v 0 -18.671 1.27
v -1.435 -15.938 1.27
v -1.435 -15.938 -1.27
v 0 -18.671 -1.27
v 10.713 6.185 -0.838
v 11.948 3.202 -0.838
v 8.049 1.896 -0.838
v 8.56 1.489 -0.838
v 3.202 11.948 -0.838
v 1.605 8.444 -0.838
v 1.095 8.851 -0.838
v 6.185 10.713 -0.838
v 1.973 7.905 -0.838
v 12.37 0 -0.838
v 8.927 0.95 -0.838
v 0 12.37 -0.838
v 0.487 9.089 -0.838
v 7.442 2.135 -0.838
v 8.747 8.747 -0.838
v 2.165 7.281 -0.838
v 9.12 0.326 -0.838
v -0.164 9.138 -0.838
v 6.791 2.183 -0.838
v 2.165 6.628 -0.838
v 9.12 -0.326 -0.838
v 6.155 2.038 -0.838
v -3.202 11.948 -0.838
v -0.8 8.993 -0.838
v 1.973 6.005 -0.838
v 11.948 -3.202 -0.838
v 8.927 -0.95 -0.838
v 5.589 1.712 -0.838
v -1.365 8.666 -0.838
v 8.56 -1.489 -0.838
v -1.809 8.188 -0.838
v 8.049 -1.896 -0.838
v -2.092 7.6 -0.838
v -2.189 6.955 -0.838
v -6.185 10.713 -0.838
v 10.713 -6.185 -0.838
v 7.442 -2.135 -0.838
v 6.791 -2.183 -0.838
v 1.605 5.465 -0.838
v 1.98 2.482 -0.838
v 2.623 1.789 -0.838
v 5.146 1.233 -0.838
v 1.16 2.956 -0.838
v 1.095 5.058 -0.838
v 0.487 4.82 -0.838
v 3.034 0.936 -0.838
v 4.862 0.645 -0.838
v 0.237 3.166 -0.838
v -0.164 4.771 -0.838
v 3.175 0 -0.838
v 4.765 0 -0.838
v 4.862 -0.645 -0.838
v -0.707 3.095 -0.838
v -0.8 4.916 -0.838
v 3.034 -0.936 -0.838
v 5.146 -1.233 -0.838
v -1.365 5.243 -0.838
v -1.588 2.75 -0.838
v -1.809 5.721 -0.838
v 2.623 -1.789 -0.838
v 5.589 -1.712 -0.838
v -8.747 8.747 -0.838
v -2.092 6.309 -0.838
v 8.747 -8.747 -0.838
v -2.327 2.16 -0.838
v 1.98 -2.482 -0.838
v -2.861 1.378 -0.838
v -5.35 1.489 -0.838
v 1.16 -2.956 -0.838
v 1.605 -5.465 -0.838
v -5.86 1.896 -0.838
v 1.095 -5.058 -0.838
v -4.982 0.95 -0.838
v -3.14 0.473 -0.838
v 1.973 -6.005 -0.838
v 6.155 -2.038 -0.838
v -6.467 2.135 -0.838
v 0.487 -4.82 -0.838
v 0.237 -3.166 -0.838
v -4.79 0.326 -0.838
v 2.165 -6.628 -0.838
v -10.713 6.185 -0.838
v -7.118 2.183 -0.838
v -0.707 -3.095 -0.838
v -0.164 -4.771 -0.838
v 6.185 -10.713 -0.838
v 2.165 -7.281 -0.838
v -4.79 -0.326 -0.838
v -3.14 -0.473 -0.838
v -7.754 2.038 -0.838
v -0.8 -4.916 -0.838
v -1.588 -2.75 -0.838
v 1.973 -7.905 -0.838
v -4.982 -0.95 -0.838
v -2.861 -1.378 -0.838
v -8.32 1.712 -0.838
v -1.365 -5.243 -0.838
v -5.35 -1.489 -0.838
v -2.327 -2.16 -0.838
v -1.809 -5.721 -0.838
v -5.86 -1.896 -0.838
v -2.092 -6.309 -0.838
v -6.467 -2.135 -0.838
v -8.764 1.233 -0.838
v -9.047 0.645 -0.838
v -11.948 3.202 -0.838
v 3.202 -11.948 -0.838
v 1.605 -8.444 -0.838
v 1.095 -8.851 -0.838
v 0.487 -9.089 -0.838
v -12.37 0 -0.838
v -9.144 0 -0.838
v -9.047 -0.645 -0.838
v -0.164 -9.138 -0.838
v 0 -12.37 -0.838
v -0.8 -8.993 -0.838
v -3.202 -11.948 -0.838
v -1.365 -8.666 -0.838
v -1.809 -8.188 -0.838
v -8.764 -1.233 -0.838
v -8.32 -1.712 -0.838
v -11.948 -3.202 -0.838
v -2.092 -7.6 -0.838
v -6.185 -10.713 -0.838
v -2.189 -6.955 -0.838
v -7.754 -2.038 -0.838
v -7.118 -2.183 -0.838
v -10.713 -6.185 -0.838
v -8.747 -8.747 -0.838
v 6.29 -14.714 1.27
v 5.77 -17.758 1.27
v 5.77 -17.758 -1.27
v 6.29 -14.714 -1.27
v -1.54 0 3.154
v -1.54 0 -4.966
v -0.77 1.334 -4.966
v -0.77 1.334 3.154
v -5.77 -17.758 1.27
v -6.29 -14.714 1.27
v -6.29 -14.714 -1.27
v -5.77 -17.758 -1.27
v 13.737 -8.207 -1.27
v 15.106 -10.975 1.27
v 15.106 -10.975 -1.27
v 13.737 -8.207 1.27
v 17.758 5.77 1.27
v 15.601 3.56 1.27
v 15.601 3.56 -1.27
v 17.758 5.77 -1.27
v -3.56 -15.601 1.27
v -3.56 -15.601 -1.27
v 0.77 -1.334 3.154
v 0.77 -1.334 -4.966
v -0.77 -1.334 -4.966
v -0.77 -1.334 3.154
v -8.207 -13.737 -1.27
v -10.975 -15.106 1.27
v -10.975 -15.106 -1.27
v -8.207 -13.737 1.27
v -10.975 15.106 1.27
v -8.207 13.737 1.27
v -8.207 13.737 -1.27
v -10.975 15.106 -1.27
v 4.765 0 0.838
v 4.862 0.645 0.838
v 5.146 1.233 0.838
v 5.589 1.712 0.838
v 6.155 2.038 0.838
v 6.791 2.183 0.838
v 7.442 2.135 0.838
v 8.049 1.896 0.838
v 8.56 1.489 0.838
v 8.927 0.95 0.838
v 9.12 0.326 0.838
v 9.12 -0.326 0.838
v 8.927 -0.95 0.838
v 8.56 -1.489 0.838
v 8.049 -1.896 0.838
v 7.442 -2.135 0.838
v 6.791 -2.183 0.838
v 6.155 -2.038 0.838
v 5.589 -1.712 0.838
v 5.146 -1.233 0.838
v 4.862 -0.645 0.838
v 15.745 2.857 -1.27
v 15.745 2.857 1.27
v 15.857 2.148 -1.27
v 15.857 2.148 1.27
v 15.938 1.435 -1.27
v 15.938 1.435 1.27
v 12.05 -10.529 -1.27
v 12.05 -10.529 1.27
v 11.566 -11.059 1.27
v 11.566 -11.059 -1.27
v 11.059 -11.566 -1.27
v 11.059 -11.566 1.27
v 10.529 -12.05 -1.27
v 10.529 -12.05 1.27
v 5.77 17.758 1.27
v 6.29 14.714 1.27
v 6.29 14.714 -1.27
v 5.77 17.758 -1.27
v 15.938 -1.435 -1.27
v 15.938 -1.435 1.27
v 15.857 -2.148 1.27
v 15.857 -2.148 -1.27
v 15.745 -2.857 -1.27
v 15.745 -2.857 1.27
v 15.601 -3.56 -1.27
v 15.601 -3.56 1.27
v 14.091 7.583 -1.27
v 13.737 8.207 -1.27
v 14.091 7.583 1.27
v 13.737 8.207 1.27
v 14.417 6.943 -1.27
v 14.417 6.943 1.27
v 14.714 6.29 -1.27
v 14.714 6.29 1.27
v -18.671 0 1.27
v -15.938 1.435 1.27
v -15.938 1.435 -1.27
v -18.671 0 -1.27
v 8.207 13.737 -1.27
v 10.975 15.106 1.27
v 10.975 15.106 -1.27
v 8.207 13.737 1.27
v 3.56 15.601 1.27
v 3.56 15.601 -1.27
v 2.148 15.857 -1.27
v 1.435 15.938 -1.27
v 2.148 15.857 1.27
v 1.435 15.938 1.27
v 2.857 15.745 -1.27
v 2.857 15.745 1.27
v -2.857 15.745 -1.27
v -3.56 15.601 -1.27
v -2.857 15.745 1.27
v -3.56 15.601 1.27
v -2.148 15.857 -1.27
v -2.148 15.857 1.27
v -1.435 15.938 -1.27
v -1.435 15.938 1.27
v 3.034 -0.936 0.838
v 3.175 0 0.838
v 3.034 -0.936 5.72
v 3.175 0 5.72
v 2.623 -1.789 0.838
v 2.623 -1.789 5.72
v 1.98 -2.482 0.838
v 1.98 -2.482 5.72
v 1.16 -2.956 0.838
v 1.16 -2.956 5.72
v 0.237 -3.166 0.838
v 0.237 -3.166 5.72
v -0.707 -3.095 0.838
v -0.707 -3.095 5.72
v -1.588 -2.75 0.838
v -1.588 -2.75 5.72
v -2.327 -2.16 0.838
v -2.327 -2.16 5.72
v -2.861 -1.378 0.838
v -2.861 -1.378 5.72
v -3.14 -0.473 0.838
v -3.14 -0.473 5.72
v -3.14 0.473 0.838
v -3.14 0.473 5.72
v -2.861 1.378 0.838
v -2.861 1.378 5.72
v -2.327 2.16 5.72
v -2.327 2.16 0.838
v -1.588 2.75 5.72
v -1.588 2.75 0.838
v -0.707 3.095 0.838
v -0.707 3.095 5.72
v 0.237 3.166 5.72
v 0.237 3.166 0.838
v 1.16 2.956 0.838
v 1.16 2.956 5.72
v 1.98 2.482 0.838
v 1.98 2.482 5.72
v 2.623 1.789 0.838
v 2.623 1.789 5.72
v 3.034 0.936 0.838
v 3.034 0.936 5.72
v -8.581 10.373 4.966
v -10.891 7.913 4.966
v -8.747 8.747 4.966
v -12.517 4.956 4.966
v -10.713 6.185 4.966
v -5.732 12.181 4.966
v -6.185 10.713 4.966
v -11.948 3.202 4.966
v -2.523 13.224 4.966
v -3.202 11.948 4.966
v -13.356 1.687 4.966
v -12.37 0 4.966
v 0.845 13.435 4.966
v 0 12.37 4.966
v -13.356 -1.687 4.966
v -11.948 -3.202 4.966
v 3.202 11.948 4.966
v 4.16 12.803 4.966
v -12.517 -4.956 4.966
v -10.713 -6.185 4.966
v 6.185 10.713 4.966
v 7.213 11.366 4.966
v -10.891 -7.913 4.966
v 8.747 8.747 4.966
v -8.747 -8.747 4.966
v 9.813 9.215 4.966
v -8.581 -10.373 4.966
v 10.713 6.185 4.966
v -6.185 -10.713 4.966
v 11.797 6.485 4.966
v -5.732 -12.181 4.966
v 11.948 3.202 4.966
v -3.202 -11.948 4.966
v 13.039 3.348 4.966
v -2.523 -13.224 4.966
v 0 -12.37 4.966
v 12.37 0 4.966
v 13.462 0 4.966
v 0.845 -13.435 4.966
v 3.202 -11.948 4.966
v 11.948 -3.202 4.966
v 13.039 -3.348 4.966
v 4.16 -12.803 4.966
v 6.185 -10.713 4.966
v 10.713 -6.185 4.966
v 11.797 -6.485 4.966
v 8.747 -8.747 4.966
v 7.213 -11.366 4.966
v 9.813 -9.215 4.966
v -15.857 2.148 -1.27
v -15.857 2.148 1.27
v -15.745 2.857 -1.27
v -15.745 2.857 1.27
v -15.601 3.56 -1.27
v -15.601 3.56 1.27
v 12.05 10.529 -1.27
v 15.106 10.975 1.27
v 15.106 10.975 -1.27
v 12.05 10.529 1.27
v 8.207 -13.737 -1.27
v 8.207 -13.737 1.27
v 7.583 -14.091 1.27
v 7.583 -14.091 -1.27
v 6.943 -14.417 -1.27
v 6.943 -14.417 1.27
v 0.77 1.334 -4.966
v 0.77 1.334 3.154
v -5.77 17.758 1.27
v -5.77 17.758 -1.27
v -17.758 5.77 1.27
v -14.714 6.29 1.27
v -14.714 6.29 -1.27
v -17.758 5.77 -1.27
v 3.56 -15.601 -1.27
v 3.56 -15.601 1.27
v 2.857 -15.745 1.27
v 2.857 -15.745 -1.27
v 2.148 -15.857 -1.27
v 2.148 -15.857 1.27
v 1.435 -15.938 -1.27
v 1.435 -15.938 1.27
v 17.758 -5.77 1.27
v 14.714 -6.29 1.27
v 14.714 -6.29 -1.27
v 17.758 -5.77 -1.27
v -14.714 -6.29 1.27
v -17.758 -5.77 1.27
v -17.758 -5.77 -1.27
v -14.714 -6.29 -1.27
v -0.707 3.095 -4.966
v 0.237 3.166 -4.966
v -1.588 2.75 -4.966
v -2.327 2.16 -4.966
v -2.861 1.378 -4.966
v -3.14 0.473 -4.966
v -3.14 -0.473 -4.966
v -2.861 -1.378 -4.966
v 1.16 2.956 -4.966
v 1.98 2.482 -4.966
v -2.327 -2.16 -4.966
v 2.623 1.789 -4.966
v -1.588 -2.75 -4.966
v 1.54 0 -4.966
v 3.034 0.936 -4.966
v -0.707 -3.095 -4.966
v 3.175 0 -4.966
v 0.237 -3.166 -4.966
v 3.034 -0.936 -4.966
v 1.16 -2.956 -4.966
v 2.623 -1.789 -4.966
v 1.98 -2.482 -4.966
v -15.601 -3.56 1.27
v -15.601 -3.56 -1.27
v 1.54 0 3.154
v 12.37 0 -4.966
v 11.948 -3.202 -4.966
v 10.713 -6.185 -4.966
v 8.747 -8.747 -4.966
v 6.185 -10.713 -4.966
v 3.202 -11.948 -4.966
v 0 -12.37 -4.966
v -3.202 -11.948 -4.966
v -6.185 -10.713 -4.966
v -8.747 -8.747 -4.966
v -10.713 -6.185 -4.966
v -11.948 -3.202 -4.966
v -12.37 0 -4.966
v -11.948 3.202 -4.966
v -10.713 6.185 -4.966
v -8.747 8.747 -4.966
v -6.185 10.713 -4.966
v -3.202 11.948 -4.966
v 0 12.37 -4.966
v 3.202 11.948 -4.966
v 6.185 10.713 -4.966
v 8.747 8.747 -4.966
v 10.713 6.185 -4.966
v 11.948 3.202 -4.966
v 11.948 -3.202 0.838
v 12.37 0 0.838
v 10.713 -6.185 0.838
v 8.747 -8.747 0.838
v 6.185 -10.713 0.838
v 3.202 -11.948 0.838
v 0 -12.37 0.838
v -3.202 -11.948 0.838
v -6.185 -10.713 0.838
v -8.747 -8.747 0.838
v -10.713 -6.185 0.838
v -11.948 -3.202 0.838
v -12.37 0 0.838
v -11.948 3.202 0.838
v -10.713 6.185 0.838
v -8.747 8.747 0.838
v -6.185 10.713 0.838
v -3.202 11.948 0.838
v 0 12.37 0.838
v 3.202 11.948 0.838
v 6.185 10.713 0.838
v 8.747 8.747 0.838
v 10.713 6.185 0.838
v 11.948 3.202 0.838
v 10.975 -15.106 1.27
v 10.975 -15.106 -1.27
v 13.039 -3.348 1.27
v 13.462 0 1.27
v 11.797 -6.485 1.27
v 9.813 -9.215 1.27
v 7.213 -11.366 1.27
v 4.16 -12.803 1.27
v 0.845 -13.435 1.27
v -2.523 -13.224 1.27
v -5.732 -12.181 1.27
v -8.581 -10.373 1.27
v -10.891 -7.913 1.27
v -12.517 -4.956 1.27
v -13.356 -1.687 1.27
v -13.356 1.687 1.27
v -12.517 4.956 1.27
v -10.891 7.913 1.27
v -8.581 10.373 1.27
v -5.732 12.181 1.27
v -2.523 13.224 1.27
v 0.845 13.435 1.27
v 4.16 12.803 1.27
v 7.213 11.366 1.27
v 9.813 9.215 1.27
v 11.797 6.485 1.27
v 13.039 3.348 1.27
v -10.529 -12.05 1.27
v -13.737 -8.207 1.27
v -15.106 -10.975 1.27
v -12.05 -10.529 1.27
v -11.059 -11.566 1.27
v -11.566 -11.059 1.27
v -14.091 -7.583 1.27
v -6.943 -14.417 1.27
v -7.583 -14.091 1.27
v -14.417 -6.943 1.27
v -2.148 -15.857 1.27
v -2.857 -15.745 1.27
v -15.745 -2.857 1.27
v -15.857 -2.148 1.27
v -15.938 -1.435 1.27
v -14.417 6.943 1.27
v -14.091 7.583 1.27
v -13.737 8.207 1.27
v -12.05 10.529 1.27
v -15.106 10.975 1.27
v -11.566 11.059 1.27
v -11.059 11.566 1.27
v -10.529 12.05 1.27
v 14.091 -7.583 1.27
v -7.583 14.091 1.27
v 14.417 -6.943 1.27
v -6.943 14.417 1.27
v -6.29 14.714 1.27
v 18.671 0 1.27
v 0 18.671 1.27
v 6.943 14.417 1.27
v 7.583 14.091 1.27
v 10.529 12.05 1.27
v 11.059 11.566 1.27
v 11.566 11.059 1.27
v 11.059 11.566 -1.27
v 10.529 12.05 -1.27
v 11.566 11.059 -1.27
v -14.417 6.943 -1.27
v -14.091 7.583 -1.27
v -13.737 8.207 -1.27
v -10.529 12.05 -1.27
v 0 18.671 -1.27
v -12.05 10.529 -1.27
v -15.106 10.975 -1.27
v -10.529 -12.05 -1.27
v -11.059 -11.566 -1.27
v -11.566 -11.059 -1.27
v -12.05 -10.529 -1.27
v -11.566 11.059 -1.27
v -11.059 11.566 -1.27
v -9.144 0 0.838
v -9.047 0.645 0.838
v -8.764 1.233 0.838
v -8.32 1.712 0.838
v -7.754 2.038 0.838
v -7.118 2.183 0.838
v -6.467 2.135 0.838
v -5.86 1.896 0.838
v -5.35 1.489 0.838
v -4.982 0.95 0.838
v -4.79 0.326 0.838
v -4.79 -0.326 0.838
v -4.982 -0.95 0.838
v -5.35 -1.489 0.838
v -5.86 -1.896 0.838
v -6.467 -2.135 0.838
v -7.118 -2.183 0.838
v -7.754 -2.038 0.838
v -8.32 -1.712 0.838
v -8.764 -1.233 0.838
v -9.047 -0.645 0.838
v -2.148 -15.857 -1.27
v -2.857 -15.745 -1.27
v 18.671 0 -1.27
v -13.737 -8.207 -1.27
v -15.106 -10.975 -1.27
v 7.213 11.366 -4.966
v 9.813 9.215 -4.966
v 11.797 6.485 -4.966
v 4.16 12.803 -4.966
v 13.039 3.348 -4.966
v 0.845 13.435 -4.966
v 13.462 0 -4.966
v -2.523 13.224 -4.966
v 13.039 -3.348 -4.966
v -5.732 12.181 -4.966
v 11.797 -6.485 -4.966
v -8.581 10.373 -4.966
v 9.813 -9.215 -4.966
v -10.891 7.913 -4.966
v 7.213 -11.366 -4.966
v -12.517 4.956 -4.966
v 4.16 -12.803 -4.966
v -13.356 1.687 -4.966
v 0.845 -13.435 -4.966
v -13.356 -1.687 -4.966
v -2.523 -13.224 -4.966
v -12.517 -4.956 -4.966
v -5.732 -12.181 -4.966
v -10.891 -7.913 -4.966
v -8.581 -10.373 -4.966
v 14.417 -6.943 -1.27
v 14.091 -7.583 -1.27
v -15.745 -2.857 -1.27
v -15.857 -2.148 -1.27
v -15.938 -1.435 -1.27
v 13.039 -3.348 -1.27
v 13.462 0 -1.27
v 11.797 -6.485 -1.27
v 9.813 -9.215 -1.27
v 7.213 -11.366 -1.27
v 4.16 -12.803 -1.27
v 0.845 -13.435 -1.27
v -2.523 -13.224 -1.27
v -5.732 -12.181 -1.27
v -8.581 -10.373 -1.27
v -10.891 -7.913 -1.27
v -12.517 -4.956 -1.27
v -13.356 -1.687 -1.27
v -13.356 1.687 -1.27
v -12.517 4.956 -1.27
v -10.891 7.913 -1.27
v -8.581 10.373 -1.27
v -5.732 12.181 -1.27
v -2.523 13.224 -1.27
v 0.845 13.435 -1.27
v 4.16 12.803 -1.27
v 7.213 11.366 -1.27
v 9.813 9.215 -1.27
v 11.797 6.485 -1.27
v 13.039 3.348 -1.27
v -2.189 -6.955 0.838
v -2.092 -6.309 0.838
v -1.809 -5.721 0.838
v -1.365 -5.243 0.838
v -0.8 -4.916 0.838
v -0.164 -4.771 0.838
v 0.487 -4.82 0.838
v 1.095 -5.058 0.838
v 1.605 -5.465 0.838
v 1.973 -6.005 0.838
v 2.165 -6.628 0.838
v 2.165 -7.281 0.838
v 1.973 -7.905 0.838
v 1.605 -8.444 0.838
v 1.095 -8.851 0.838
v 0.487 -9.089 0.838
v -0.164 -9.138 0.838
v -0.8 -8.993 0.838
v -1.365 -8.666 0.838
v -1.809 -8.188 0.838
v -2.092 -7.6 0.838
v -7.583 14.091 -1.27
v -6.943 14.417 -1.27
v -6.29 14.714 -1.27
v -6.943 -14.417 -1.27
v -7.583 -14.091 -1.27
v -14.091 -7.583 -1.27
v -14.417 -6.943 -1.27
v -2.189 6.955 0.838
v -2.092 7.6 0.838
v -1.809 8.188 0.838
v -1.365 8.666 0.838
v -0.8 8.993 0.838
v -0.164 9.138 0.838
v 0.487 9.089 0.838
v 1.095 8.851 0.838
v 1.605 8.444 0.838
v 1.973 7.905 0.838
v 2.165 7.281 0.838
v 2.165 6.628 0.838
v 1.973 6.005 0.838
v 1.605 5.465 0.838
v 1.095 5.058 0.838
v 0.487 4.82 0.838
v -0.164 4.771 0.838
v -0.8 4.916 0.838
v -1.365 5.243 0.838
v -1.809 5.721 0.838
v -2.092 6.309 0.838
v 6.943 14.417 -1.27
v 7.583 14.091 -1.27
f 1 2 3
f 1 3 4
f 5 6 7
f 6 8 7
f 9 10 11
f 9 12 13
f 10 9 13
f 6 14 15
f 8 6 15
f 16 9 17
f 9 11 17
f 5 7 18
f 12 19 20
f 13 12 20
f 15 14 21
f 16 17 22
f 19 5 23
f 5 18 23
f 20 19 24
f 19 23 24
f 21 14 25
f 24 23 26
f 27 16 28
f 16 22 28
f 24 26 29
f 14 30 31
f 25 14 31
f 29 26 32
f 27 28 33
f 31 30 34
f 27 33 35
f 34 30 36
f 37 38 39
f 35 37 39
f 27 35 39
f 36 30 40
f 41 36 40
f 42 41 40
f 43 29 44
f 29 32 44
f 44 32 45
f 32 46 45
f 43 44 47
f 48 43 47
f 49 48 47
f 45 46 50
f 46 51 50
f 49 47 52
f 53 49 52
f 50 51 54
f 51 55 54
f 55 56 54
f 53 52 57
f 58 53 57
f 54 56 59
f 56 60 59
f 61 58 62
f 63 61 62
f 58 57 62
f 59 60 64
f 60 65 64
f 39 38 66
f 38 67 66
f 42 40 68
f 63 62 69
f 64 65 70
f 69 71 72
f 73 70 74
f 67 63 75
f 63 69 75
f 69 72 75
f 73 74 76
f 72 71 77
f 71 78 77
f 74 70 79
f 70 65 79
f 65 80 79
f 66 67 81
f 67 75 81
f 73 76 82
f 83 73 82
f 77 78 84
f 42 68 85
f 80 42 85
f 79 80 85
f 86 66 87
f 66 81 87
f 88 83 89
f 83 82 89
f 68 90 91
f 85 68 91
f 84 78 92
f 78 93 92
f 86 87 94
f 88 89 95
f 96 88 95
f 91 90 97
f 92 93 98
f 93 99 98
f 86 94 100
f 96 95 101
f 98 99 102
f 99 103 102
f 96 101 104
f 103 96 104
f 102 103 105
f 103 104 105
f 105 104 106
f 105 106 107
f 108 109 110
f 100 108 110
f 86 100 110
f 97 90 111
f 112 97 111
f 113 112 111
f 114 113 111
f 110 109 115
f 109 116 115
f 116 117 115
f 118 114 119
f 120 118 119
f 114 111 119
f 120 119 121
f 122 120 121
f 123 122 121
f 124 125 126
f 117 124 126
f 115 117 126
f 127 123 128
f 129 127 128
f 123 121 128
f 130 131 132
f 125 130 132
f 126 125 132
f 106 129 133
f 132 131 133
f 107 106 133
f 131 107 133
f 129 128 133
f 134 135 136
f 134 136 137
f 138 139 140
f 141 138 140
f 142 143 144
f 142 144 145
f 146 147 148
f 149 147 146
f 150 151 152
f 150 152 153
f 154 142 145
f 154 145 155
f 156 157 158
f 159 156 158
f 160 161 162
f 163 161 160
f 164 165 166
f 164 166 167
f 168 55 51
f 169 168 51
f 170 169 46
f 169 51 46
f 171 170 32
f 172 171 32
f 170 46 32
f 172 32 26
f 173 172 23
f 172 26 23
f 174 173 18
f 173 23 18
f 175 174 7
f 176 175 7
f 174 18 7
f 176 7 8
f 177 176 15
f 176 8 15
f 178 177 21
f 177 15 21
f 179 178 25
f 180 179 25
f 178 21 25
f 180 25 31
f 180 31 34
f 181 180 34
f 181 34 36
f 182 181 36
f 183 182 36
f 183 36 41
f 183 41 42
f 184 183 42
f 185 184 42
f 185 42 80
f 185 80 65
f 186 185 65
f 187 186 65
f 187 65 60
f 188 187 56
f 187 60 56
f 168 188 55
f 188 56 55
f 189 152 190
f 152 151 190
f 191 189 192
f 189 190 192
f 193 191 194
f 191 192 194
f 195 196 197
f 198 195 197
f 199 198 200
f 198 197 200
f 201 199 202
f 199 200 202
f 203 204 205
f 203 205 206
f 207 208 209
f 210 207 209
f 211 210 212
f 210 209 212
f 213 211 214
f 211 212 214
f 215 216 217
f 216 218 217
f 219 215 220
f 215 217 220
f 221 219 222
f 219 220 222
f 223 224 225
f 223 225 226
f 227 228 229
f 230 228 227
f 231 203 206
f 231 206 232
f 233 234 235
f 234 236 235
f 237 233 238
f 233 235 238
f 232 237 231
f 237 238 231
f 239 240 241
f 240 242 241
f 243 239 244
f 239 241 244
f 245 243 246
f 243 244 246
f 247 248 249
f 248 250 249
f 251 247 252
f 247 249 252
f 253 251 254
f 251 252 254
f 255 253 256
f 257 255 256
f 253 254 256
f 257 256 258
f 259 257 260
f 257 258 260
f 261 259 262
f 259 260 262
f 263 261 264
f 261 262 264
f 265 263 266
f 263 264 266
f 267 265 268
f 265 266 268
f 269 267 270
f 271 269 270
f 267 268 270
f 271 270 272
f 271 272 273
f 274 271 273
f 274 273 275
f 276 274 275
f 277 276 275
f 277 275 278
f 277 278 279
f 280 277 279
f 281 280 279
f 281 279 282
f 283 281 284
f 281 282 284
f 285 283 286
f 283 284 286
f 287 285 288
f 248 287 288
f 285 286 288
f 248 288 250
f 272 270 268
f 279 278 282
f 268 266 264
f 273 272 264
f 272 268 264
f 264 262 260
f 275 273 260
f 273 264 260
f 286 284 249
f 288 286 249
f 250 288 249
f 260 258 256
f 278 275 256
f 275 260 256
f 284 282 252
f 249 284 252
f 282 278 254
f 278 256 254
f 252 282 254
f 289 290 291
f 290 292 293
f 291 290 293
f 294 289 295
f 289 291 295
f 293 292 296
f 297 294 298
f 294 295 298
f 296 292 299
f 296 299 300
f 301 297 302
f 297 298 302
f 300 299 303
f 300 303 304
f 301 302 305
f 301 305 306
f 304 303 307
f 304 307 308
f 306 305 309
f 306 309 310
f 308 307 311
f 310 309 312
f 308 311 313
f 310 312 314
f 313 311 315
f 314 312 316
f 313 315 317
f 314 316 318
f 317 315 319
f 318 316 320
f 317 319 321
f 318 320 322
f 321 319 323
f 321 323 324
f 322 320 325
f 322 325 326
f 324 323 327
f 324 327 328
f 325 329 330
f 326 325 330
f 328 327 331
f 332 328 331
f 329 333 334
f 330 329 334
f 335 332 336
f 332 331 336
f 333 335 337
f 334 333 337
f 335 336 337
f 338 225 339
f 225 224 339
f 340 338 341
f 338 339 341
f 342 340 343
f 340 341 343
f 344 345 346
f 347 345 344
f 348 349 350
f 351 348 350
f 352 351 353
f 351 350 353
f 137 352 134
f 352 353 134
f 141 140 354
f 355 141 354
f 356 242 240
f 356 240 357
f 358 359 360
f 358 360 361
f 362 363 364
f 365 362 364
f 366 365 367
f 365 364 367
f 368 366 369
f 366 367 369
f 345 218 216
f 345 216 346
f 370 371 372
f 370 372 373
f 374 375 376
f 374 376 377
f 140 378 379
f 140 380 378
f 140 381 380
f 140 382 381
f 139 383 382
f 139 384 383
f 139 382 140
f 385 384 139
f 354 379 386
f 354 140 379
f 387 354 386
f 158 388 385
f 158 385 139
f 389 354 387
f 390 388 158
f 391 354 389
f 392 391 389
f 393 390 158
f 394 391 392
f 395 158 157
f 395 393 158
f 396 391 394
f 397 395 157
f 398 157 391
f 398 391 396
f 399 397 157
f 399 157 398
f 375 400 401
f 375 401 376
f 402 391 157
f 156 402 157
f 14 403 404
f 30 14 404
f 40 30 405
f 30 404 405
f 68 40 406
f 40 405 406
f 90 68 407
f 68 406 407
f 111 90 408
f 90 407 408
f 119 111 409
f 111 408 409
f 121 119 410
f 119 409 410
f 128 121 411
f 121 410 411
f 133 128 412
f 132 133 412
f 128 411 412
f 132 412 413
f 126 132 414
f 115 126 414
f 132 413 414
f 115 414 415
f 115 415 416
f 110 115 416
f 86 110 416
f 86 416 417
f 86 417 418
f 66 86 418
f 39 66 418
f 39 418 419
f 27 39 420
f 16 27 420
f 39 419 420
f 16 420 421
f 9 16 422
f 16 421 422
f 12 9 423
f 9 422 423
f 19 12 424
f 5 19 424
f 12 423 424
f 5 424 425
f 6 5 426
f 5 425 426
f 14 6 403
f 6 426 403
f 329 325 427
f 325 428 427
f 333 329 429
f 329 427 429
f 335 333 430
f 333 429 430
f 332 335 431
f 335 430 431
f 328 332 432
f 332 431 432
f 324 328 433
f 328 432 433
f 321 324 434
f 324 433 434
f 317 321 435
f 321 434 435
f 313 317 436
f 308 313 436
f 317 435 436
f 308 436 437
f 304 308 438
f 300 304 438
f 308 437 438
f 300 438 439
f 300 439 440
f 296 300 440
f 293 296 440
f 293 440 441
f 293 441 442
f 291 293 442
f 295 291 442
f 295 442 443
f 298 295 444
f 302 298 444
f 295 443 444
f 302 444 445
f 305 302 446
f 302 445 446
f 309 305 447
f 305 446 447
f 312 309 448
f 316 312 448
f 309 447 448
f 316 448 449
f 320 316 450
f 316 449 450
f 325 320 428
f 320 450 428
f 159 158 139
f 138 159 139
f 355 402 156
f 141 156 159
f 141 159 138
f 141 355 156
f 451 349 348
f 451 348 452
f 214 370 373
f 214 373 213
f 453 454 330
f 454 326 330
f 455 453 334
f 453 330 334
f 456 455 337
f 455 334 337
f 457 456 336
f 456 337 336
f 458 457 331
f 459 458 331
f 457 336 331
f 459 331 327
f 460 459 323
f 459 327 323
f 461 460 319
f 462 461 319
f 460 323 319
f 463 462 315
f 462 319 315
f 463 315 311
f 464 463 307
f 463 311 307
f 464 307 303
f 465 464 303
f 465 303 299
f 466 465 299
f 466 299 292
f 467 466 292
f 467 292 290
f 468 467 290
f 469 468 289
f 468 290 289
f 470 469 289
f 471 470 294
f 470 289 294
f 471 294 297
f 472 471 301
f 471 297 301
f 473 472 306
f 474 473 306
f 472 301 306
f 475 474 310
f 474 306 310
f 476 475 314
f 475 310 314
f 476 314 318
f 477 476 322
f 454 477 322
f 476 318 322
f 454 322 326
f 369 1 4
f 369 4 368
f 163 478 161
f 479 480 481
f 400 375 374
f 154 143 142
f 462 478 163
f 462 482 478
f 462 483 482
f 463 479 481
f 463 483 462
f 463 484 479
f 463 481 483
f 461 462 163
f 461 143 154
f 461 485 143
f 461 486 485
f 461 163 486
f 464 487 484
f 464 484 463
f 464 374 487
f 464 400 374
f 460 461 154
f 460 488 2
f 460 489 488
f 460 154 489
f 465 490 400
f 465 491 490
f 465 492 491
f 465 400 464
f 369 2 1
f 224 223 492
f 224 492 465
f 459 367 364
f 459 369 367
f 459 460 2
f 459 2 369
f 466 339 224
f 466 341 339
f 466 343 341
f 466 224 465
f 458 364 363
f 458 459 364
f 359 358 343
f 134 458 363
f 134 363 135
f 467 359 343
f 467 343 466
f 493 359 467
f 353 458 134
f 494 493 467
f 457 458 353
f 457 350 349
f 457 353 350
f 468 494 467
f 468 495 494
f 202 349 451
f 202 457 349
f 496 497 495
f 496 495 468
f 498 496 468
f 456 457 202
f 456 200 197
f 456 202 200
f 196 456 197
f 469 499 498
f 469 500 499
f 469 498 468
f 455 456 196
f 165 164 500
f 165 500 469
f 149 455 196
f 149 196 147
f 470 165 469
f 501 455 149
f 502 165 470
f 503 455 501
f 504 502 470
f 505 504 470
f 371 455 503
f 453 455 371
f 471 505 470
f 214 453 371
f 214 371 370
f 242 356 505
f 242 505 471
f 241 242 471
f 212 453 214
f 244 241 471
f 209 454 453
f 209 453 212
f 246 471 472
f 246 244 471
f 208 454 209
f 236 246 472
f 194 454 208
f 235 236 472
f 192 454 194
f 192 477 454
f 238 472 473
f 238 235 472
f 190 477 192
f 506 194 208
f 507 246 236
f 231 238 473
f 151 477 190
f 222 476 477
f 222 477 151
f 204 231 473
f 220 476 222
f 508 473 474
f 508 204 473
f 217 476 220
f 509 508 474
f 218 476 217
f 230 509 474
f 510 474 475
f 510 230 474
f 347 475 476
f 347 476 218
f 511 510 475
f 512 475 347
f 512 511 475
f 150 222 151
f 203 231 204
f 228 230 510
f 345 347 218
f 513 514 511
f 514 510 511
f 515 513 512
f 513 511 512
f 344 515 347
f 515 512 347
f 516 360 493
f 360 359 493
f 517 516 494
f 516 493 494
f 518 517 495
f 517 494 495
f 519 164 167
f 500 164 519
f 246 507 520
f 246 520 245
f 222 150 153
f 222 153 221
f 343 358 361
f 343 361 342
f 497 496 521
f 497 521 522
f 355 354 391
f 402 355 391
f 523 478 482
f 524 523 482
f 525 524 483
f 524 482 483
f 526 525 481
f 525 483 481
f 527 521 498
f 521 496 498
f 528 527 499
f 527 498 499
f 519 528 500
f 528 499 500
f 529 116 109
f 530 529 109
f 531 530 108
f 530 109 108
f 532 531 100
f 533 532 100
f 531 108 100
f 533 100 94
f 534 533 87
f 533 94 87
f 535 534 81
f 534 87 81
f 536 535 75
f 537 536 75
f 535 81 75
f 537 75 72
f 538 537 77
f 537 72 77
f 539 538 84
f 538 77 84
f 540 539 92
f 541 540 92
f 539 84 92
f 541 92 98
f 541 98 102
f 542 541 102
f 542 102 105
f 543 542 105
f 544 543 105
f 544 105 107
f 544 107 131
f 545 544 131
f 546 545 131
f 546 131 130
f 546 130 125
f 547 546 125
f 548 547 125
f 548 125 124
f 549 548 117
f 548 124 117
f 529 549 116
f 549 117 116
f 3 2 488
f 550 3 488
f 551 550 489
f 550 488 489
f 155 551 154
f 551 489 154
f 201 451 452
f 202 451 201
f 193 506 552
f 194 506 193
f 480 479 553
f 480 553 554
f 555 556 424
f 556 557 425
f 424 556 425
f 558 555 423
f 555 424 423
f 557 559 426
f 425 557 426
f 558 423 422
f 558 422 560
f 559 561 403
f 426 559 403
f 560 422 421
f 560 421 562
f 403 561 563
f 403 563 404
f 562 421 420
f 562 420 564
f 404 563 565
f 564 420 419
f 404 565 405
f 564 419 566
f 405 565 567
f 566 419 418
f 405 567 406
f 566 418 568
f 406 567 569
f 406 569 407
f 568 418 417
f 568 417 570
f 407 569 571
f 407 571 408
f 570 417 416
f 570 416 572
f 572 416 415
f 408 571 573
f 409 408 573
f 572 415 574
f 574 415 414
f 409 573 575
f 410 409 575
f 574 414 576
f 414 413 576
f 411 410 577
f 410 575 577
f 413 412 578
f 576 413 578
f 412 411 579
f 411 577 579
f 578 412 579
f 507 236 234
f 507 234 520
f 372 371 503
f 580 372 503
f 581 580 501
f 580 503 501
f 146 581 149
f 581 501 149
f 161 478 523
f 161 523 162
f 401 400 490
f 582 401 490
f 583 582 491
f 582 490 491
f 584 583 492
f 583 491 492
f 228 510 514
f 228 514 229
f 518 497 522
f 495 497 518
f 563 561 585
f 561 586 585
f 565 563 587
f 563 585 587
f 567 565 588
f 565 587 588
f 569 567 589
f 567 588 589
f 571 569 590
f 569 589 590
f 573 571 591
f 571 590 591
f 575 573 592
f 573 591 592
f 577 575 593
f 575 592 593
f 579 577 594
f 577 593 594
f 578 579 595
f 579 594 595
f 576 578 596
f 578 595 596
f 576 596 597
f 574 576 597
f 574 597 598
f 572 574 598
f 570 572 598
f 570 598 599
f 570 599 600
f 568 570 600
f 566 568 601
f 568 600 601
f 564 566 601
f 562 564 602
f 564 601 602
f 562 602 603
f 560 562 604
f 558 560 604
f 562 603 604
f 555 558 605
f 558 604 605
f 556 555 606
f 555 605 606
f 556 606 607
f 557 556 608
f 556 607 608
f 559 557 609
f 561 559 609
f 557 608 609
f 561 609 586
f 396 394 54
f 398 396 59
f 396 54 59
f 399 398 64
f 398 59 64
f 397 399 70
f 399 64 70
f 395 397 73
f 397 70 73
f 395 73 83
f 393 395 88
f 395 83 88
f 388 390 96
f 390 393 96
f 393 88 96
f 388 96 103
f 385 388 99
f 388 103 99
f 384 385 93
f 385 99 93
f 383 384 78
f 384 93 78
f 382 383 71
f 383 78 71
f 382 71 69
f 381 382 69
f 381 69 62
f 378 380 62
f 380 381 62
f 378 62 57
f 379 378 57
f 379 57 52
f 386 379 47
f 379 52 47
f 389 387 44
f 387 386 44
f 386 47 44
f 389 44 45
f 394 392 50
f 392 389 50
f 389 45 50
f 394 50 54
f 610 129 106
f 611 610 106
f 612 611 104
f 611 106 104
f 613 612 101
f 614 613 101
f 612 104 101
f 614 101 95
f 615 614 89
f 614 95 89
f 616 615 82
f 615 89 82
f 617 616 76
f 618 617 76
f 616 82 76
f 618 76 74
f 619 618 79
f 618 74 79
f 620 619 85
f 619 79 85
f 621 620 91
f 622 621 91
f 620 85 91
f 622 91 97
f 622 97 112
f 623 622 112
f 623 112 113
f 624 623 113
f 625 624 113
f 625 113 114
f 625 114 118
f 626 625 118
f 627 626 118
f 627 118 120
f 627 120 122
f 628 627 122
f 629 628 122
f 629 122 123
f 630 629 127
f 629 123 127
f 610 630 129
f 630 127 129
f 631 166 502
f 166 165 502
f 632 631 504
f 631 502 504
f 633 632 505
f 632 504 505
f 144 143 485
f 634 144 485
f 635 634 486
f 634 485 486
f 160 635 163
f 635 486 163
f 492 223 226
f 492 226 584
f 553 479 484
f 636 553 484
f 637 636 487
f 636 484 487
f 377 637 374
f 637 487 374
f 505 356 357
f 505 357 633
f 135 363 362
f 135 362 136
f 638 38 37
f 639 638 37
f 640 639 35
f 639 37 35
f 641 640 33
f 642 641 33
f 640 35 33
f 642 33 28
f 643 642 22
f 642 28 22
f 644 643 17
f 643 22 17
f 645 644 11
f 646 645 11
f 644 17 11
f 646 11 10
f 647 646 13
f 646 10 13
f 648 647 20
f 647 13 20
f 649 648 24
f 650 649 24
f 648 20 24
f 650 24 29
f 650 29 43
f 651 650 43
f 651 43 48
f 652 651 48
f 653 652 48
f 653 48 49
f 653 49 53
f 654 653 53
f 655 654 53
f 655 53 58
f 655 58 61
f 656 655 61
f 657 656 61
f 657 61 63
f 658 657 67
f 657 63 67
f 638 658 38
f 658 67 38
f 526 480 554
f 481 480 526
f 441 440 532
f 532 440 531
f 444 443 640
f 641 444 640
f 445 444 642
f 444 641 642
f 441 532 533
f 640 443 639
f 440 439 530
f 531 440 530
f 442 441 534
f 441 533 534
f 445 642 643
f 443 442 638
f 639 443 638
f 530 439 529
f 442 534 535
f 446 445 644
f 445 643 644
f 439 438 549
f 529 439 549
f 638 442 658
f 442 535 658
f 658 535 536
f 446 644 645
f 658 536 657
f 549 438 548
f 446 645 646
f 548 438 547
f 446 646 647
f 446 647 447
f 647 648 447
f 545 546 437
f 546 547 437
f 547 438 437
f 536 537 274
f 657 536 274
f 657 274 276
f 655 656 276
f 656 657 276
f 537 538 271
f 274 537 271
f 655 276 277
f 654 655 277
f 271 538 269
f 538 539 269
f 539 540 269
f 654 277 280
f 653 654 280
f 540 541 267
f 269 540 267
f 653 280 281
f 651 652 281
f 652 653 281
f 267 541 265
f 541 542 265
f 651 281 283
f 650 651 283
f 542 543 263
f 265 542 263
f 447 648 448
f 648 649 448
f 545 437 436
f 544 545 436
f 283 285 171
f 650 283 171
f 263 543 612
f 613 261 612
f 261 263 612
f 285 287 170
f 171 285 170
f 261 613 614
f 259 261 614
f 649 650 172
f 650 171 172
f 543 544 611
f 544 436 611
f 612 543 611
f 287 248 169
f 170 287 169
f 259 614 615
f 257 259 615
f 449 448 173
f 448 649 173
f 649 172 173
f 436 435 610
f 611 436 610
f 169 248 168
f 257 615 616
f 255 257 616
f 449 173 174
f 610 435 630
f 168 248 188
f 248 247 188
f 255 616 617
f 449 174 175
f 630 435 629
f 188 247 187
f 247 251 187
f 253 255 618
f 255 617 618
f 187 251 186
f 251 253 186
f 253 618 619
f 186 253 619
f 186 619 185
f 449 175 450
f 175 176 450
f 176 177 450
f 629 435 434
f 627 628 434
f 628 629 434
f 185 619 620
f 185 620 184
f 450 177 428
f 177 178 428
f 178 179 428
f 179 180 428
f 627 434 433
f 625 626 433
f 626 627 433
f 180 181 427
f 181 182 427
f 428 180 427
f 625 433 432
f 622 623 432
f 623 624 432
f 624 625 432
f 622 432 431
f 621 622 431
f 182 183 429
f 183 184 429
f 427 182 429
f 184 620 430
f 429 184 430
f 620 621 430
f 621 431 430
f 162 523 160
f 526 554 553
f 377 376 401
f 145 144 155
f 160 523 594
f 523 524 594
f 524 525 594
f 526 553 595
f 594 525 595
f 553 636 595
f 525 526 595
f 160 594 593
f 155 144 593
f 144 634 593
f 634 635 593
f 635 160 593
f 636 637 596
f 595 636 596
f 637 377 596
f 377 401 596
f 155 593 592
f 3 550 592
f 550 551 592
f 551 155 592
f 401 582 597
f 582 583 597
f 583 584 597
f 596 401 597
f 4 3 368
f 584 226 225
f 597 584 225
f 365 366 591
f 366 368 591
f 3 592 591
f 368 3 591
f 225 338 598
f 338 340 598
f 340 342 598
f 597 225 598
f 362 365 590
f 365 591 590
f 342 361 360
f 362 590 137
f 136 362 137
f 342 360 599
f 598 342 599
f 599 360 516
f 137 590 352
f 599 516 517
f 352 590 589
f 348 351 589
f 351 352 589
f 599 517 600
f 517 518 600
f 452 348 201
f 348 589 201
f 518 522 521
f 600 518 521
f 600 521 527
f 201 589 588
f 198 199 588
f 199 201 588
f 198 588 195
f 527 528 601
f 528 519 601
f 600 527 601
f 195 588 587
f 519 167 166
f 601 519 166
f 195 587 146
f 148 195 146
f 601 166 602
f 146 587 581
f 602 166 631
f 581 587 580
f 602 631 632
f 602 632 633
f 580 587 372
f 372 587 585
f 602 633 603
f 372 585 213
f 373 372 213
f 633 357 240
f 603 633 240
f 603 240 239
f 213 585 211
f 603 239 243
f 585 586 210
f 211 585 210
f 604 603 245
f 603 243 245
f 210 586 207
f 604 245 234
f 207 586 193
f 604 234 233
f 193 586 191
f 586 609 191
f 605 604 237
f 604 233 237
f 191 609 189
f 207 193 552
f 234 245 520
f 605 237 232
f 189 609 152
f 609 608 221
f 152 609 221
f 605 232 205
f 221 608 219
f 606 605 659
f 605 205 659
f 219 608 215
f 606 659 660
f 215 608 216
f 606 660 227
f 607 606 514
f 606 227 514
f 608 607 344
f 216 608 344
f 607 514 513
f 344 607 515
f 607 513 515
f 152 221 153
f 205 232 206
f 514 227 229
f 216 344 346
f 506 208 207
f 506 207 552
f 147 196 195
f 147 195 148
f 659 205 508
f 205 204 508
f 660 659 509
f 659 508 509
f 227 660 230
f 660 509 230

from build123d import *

# Parameters (mm, degrees)
CUT_EXTRUDE2_DEPTH  = 17.78
SKETCH4_R           = 2.189434211
CUT_EXTRUDE3_DEPTH  = 1.6764
BOSS_EXTRUDE1_DEPTH = 2.54
SKETCH6_R           = 12.3698
CUT_EXTRUDE4_DEPTH  = 29.485557153


with BuildPart() as part:
    # Sketch1 → Revolve1 (revolve)
    with BuildSketch(Plane(origin=(0, 0, 0), x_dir=(0, 0, -1), z_dir=(1, 0, 0)), mode=Mode.PRIVATE) as revolve1_sk:
        Polygon((4.9657, 13.462), (1.27, 13.462), (1.27, 16.002), (-1.27, 16.002), (-1.27, 13.462), (-4.9657, 13.462), (-4.9657, 12.3698), (-0.8382, 12.3698), (-0.8382, 3.175), (-5.719832453, 3.175), (-5.719832453, 0), (0, 0), (14.625567547, 0), (14.625567547, 3.175), (0.8382, 3.175), (0.8382, 12.3698), (4.9657, 12.3698), align=None)
    revolve(revolve1_sk.sketch.rotate(Axis((0, 0, 0), (0, 0, -1)), 90), axis=Axis((0, 0, 0), (0, 0, -1)))

    # Sketch3 → Cut-Extrude2 (cut)
    with BuildSketch(Plane(origin=(0, 0, -14.625567547), x_dir=(-1, 0, 0), z_dir=(0, 0, -1))):
        Polygon((1.539793168, 0), (0.769896584, 1.3335), (-0.769896584, 1.3335), (-1.539793168, 0), (-0.769896584, -1.3335), (0.769896584, -1.3335), align=None)
    extrude(amount=-CUT_EXTRUDE2_DEPTH, mode=Mode.SUBTRACT)

    # Sketch4 → Cut-Extrude3 (cut)
    with BuildSketch(Plane(origin=(0, 0, -0.8382), x_dir=(-1, 0, 0), z_dir=(0, 0, -1))):
        with Locations((0, 6.954565789)):
            Circle(SKETCH4_R)
        with Locations((6.954565789, 0)):
            Circle(SKETCH4_R)
        with Locations((0, -6.954565789)):
            Circle(SKETCH4_R)
        with Locations((-6.954565789, 0)):
            Circle(SKETCH4_R)
    extrude(amount=-CUT_EXTRUDE3_DEPTH, mode=Mode.SUBTRACT)

    # Sketch5 → Boss-Extrude1 (add)
    with BuildSketch(Plane.XY.offset(1.27)):
        with BuildLine():
            ThreePointArc((-13.73725383, 8.206817971), (-12.945889944, 9.405739607), (-12.050192599, 10.528858548))
            Line((-12.050192599, 10.528858548), (-15.10552331, 10.974805092))
            Line((-15.10552331, 10.974805092), (-13.73725383, 8.206817971))
        make_face()
        with BuildLine():
            ThreePointArc((-10.528858548, 12.050192599), (-9.405739607, 12.945889944), (-8.206817971, 13.73725383))
            Line((-8.206817971, 13.73725383), (-10.974805092, 15.10552331))
            Line((-10.974805092, 15.10552331), (-10.528858548, 12.050192599))
        make_face()
        with BuildLine():
            ThreePointArc((-6.289825233, 14.714010417), (-4.944889944, 15.218806374), (-3.56010282, 15.600950994))
            Line((-3.56010282, 15.600950994), (-5.769796486, 17.757607659))
            Line((-5.769796486, 17.757607659), (-6.289825233, 14.714010417))
        make_face()
        with BuildLine():
            ThreePointArc((-1.4351, 15.937518376), (0, 16.002), (1.4351, 15.937518376))
            Line((1.4351, 15.937518376), (0, 18.671453646))
            Line((0, 18.671453646), (-1.4351, 15.937518376))
        make_face()
        with BuildLine():
            ThreePointArc((3.56010282, 15.600950994), (4.944889944, 15.218806374), (6.289825233, 14.714010417))
            Line((6.289825233, 14.714010417), (5.769796486, 17.757607659))
            Line((5.769796486, 17.757607659), (3.56010282, 15.600950994))
        make_face()
        with BuildLine():
            ThreePointArc((8.206817971, 13.73725383), (9.405739607, 12.945889944), (10.528858548, 12.050192599))
            Line((10.528858548, 12.050192599), (10.974805092, 15.10552331))
            Line((10.974805092, 15.10552331), (8.206817971, 13.73725383))
        make_face()
        with BuildLine():
            ThreePointArc((12.050192599, 10.528858548), (12.945889944, 9.405739607), (13.73725383, 8.206817971))
            Line((13.73725383, 8.206817971), (15.10552331, 10.974805092))
            Line((15.10552331, 10.974805092), (12.050192599, 10.528858548))
        make_face()
        with BuildLine():
            ThreePointArc((14.714010417, 6.289825233), (15.218806374, 4.944889944), (15.600950994, 3.56010282))
            Line((15.600950994, 3.56010282), (17.757607659, 5.769796486))
            Line((17.757607659, 5.769796486), (14.714010417, 6.289825233))
        make_face()
        with BuildLine():
            Line((18.671453646, 0), (16.002, 0))
            ThreePointArc((16.002, 0), (15.985871466, -0.718273954), (15.937518376, -1.4351))
            Line((15.937518376, -1.4351), (18.671453646, 0))
        make_face()
        with BuildLine():
            ThreePointArc((15.937518376, 1.4351), (15.985871466, 0.718273954), (16.002, 0))
            Line((16.002, 0), (18.671453646, 0))
            Line((18.671453646, 0), (15.937518376, 1.4351))
        make_face()
        with BuildLine():
            Line((17.757607659, -5.769796486), (15.600950994, -3.56010282))
            ThreePointArc((15.600950994, -3.56010282), (15.218806374, -4.944889944), (14.714010417, -6.289825233))
            Line((14.714010417, -6.289825233), (17.757607659, -5.769796486))
        make_face()
        with BuildLine():
            Line((15.10552331, -10.974805092), (13.73725383, -8.206817971))
            ThreePointArc((13.73725383, -8.206817971), (12.945889944, -9.405739607), (12.050192599, -10.528858548))
            Line((12.050192599, -10.528858548), (15.10552331, -10.974805092))
        make_face()
        with BuildLine():
            Line((10.974805092, -15.10552331), (10.528858548, -12.050192599))
            ThreePointArc((10.528858548, -12.050192599), (9.405739607, -12.945889944), (8.206817971, -13.73725383))
            Line((8.206817971, -13.73725383), (10.974805092, -15.10552331))
        make_face()
        with BuildLine():
            Line((5.769796486, -17.757607659), (6.289825233, -14.714010417))
            ThreePointArc((6.289825233, -14.714010417), (4.944889944, -15.218806374), (3.56010282, -15.600950994))
            Line((3.56010282, -15.600950994), (5.769796486, -17.757607659))
        make_face()
        with BuildLine():
            Line((0, -18.671453646), (1.4351, -15.937518376))
            ThreePointArc((1.4351, -15.937518376), (0, -16.002), (-1.4351, -15.937518376))
            Line((-1.4351, -15.937518376), (0, -18.671453646))
        make_face()
        with BuildLine():
            Line((-5.769796486, -17.757607659), (-3.56010282, -15.600950994))
            ThreePointArc((-3.56010282, -15.600950994), (-4.944889944, -15.218806374), (-6.289825233, -14.714010417))
            Line((-6.289825233, -14.714010417), (-5.769796486, -17.757607659))
        make_face()
        with BuildLine():
            Line((-10.974805092, -15.10552331), (-8.206817971, -13.73725383))
            ThreePointArc((-8.206817971, -13.73725383), (-9.405739607, -12.945889944), (-10.528858548, -12.050192599))
            Line((-10.528858548, -12.050192599), (-10.974805092, -15.10552331))
        make_face()
        with BuildLine():
            Line((-15.10552331, -10.974805092), (-12.050192599, -10.528858548))
            ThreePointArc((-12.050192599, -10.528858548), (-12.945889944, -9.405739607), (-13.73725383, -8.206817971))
            Line((-13.73725383, -8.206817971), (-15.10552331, -10.974805092))
        make_face()
        with BuildLine():
            Line((-17.757607659, -5.769796486), (-14.714010417, -6.289825233))
            ThreePointArc((-14.714010417, -6.289825233), (-15.218806374, -4.944889944), (-15.600950994, -3.56010282))
            Line((-15.600950994, -3.56010282), (-17.757607659, -5.769796486))
        make_face()
        with BuildLine():
            ThreePointArc((-15.937518376, -1.4351), (-16.002, 0), (-15.937518376, 1.4351))
            Line((-15.937518376, 1.4351), (-18.671453646, 0))
            Line((-18.671453646, 0), (-15.937518376, -1.4351))
        make_face()
        with BuildLine():
            ThreePointArc((-15.600950994, 3.56010282), (-15.218806374, 4.944889944), (-14.714010417, 6.289825233))
            Line((-14.714010417, 6.289825233), (-17.757607659, 5.769796486))
            Line((-17.757607659, 5.769796486), (-15.600950994, 3.56010282))
        make_face()
    extrude(amount=-BOSS_EXTRUDE1_DEPTH)

    # Sketch6 → Cut-Extrude4 (cut, through all)
    with BuildSketch(Plane(origin=(0, 0, -4.9657), x_dir=(-1, 0, 0), z_dir=(0, 0, -1))):
        with Locations(Location((0, 0, 0), (0, 0, 180))):
            Circle(SKETCH6_R)
    extrude(amount=CUT_EXTRUDE4_DEPTH, mode=Mode.SUBTRACT)


solid = part.part
